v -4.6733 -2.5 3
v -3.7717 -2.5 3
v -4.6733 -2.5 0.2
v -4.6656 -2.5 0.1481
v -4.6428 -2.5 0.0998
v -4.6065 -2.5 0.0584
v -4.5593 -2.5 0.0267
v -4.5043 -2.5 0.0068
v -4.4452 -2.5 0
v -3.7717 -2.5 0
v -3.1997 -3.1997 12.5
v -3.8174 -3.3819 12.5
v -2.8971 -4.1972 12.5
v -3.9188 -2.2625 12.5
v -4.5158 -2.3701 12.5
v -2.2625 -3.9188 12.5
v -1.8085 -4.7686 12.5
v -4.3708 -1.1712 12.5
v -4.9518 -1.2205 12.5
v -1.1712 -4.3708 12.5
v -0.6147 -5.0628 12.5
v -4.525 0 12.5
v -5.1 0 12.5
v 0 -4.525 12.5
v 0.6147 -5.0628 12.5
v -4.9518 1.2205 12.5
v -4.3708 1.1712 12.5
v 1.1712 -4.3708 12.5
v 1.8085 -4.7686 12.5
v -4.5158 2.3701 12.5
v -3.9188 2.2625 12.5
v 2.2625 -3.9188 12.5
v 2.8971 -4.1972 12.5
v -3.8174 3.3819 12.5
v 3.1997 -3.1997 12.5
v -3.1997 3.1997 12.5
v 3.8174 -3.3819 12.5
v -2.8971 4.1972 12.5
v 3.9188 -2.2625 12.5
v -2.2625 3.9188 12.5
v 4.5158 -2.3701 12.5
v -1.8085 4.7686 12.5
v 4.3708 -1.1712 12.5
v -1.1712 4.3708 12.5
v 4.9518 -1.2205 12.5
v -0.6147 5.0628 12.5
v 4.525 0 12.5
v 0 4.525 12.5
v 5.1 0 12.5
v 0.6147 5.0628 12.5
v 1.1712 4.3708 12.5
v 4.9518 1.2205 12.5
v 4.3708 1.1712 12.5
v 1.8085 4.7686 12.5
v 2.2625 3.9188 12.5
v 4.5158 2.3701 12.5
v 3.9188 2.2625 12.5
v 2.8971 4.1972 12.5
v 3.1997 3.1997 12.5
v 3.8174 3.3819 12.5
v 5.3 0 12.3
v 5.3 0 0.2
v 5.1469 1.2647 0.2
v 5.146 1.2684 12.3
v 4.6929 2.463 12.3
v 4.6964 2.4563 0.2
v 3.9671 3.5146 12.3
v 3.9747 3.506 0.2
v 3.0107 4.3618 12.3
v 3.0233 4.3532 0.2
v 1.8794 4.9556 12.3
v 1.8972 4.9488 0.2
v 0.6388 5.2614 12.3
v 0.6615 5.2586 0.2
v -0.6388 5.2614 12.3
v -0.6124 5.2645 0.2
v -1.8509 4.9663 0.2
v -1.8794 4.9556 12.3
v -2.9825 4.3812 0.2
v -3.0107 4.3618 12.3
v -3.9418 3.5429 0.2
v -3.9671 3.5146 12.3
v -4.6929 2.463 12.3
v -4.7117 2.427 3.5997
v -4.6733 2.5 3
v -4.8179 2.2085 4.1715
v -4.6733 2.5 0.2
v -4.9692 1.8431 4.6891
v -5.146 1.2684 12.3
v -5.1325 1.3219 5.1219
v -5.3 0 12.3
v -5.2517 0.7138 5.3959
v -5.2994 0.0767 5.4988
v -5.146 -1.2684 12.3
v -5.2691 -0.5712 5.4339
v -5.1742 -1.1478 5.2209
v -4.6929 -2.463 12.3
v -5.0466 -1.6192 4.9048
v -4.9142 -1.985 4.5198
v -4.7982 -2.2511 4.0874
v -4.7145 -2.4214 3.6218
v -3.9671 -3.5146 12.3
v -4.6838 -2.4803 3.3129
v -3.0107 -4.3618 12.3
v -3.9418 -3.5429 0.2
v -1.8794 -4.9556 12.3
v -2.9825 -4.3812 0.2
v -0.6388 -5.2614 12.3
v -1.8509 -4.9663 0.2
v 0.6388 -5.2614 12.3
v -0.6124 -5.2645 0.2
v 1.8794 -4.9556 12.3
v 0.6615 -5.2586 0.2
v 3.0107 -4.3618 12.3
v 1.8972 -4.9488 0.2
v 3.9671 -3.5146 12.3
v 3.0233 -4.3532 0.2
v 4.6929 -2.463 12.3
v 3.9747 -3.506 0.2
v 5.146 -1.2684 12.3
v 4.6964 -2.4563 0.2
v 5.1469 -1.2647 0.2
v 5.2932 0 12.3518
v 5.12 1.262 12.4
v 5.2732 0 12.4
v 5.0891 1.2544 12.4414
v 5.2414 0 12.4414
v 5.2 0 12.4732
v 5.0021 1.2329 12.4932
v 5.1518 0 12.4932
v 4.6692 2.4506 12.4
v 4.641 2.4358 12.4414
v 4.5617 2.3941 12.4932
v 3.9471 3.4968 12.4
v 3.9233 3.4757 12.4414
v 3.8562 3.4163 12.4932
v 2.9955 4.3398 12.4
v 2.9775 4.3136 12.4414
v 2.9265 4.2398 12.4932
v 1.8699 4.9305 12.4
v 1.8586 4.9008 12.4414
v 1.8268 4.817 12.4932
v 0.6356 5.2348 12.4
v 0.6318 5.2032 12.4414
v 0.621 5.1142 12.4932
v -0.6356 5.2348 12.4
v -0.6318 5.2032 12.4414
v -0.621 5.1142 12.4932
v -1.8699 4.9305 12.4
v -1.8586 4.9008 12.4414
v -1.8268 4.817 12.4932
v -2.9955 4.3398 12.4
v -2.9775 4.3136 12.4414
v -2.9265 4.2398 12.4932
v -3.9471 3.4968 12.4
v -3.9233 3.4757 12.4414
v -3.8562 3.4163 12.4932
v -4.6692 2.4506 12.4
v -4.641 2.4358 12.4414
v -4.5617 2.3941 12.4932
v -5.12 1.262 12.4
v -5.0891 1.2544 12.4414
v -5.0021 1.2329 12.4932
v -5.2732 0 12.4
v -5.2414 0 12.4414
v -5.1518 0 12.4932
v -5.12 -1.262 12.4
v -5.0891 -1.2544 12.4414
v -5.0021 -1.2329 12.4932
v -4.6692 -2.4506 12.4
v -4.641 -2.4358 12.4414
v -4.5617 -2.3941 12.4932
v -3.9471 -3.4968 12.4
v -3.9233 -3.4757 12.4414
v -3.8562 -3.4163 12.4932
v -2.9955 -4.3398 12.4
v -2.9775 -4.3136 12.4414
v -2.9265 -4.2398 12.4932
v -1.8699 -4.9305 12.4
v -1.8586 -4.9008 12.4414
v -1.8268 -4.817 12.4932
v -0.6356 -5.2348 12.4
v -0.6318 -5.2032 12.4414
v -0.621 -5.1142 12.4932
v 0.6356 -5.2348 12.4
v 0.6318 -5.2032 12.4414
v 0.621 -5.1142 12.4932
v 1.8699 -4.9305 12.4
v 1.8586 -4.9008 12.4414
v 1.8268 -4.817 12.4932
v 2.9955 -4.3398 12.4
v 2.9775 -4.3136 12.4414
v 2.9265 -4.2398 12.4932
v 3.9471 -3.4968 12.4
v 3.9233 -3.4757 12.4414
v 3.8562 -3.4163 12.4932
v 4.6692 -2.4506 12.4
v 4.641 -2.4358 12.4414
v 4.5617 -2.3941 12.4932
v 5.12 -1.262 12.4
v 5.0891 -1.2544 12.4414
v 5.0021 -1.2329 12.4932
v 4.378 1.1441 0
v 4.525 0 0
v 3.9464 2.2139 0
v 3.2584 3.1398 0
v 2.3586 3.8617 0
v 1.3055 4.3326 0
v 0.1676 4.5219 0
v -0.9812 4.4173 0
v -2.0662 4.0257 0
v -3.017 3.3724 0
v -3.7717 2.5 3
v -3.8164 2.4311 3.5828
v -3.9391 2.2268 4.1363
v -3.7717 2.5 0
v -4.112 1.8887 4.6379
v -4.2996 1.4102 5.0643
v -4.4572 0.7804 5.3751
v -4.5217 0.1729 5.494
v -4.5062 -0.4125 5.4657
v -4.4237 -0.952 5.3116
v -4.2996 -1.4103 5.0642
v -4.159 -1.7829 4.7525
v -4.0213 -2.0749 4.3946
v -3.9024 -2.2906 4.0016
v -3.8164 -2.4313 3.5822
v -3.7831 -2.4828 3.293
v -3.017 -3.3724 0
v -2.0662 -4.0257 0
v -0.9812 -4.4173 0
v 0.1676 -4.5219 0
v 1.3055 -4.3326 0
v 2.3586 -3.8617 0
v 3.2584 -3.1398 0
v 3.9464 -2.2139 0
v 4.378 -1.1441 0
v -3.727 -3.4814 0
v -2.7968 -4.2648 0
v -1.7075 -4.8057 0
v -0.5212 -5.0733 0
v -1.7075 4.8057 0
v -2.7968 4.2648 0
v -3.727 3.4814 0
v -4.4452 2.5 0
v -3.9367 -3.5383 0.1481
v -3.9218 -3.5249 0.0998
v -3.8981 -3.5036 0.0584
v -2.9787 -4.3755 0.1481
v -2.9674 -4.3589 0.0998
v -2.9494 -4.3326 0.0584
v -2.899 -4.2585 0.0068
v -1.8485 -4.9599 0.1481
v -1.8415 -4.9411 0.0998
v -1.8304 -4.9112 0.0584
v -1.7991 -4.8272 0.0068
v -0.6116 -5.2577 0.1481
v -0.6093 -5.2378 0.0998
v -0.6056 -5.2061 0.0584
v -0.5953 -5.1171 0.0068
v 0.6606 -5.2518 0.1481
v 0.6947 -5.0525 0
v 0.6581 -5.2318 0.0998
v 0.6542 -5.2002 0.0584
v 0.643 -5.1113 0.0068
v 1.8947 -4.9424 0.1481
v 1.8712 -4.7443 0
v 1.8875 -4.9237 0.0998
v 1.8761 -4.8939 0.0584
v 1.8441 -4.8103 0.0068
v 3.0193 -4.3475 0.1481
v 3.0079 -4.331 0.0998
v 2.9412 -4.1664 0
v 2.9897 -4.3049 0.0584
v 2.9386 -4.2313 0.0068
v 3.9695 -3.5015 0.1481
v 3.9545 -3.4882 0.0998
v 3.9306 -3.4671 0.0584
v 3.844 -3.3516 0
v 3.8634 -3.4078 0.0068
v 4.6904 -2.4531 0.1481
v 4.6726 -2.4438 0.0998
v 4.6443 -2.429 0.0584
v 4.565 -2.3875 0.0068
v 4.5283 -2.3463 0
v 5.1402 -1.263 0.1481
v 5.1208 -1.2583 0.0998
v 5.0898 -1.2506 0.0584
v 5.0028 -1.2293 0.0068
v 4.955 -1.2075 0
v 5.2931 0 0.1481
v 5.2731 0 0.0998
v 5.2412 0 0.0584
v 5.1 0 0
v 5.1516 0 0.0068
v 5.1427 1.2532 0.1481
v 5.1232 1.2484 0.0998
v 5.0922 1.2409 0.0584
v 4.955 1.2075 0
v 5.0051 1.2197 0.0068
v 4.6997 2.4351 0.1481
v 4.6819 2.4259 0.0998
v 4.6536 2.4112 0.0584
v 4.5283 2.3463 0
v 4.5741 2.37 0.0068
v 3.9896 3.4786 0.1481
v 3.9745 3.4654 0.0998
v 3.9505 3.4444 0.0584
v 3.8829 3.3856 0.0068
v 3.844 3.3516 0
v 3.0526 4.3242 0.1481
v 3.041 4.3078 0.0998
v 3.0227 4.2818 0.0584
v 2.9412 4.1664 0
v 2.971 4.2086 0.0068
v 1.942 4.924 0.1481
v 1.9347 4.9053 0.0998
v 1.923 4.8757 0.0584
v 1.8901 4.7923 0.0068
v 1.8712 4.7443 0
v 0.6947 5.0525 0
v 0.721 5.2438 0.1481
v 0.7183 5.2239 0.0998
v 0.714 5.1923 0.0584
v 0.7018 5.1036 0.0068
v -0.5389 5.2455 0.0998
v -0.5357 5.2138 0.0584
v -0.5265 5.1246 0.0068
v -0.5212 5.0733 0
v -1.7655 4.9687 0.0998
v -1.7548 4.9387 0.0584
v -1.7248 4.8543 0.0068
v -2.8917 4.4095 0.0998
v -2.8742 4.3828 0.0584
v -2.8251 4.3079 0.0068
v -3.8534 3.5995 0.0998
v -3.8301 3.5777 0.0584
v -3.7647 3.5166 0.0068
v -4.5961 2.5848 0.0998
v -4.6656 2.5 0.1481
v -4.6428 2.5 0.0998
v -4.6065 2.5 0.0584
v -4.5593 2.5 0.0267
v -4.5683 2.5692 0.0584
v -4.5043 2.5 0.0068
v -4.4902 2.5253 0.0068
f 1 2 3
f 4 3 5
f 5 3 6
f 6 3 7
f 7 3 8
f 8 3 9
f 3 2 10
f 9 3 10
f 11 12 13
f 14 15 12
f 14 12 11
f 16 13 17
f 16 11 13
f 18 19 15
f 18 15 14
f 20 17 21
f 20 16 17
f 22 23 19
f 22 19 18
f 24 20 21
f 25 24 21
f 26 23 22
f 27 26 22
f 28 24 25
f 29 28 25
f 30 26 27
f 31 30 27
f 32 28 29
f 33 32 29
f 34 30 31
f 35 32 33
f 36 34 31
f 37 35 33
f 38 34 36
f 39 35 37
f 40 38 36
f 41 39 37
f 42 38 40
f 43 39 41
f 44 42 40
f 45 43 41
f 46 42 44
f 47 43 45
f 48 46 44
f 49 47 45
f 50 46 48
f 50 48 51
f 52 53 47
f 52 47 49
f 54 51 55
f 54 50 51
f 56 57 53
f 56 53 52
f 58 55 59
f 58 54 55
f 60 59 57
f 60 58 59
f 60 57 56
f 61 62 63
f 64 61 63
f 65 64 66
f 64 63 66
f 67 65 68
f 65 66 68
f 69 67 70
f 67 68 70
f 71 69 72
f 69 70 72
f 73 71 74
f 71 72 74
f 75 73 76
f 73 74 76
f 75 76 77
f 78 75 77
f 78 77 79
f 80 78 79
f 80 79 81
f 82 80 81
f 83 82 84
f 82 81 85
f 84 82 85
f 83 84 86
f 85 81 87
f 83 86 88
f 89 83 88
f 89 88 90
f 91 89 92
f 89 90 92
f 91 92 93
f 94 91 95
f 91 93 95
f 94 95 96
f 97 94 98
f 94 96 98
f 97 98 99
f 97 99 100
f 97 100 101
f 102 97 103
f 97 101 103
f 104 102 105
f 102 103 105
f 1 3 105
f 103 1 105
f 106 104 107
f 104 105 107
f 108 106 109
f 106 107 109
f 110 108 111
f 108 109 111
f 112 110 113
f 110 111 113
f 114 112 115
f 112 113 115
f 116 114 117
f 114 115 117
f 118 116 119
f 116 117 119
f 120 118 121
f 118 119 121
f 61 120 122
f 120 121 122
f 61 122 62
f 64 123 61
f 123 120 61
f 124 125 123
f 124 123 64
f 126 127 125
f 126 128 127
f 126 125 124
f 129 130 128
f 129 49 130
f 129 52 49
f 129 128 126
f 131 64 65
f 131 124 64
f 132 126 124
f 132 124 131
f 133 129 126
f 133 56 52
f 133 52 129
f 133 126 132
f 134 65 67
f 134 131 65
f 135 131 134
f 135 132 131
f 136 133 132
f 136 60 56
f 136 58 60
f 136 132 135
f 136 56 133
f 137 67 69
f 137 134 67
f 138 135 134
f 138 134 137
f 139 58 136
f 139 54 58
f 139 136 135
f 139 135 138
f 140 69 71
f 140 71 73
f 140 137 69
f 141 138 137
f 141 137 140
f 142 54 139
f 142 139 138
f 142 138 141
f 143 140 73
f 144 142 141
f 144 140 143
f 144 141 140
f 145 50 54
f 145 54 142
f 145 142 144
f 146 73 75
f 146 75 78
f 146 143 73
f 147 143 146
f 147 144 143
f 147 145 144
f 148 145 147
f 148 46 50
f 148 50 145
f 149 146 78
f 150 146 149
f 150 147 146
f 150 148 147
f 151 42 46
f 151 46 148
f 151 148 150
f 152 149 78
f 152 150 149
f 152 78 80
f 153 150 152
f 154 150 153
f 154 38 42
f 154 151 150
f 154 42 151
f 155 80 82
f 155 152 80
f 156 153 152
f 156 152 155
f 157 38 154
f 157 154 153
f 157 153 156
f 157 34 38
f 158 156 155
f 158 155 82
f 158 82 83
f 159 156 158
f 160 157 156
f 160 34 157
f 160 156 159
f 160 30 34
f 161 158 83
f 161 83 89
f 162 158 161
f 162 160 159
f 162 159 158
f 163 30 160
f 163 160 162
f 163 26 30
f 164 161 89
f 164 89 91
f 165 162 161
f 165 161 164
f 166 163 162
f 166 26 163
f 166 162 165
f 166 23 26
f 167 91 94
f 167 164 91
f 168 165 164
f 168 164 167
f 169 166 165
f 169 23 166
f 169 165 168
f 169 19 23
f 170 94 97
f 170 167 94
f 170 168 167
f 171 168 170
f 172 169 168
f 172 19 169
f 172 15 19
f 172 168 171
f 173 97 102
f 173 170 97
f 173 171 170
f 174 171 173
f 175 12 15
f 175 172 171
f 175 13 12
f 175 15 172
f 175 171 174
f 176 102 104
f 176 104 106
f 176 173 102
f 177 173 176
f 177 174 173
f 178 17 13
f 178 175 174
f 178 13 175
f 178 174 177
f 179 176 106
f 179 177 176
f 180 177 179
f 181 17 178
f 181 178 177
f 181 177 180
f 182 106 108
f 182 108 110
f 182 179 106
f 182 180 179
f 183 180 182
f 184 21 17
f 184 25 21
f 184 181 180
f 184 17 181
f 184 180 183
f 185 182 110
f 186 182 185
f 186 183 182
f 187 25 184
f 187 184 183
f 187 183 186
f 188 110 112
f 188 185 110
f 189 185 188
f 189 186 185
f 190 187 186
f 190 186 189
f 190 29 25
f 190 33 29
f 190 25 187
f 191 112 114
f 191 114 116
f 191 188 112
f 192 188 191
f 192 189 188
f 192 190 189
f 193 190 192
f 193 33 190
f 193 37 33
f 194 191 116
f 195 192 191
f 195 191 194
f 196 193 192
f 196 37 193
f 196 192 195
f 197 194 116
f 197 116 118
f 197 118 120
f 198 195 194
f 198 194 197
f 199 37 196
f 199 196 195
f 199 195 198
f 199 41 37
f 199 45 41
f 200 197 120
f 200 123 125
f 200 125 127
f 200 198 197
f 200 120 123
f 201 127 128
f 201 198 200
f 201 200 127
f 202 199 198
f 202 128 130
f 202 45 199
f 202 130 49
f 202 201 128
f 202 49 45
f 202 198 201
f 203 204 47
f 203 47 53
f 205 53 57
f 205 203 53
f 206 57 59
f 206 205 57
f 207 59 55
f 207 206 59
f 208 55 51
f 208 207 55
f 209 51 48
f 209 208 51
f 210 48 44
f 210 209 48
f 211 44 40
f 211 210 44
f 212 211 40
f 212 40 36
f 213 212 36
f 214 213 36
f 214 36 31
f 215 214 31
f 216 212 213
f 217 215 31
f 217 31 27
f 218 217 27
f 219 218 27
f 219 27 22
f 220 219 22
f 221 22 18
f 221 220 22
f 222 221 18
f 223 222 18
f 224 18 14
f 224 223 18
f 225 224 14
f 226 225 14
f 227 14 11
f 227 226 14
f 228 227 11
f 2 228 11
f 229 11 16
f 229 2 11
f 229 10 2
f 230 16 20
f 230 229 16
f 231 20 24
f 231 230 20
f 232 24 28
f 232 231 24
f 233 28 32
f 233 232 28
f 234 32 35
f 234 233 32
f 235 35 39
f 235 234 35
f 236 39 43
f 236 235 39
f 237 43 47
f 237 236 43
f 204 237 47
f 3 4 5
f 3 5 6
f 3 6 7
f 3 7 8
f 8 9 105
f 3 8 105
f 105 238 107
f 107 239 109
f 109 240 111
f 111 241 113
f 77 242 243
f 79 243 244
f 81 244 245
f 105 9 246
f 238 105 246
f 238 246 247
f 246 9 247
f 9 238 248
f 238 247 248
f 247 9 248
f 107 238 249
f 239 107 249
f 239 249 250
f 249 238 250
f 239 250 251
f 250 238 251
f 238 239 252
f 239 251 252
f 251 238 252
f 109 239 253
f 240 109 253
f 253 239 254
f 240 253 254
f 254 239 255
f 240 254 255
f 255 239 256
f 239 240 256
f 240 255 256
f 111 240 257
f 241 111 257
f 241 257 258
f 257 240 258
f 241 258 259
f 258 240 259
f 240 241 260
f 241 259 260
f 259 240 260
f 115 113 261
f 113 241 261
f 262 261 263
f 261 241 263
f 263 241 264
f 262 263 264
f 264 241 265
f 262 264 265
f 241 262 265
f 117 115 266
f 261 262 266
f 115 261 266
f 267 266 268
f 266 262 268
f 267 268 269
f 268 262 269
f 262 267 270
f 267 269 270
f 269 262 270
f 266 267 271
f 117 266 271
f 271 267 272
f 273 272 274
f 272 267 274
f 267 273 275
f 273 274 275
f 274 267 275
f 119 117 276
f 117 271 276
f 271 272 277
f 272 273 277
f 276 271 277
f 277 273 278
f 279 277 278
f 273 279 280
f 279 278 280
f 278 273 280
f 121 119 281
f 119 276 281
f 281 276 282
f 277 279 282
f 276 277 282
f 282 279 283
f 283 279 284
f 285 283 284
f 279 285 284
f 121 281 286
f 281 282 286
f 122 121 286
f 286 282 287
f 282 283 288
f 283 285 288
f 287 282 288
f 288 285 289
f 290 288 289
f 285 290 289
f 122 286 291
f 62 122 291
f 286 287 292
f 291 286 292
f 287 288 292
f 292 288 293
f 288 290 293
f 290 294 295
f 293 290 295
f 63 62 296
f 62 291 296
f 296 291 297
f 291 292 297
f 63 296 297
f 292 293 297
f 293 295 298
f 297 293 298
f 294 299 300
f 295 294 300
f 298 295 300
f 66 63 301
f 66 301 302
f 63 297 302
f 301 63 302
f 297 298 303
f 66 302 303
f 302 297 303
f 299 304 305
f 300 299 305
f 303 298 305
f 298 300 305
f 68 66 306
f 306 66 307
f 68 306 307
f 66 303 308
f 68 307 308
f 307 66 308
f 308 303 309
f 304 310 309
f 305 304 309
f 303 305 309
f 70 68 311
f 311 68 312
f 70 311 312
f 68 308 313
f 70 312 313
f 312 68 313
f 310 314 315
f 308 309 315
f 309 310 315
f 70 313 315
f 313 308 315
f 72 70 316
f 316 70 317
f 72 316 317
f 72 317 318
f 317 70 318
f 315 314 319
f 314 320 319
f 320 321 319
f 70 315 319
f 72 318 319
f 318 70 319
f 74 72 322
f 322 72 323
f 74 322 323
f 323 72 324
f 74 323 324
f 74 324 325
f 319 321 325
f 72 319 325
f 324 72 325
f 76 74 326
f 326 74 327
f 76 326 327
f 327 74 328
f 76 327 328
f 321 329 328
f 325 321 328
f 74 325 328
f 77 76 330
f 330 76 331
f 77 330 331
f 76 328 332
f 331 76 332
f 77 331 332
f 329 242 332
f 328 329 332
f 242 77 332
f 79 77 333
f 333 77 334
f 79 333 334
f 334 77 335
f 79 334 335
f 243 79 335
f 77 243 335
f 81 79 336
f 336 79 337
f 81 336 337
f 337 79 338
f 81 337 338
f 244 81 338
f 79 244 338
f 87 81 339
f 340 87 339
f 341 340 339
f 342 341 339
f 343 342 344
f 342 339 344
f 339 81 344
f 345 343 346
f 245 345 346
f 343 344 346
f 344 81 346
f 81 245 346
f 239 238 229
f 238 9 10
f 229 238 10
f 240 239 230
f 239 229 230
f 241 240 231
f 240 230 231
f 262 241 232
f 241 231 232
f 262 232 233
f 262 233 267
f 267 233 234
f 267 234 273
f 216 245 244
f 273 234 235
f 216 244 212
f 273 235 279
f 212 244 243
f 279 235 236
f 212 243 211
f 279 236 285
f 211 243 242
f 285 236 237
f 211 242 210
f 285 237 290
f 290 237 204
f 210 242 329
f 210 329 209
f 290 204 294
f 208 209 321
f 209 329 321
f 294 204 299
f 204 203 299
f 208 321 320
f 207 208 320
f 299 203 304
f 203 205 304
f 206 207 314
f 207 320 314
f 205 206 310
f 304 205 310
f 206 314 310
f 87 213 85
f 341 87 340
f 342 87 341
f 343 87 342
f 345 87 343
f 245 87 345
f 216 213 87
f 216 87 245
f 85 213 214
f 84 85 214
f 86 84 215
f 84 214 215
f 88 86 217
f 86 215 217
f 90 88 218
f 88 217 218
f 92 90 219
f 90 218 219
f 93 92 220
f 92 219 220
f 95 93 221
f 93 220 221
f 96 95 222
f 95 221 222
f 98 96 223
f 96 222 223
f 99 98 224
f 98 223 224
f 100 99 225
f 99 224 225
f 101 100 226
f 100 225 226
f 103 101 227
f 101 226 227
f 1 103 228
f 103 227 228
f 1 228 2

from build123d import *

# Parameters (mm, degrees)
SKETCH_1_R          = 5.3
SKETCH_1_R_2        = 4.525
EXTRUDE_1_DEPTH     = 12.5
SKETCH_2_R          = 2.5
SKETCH_2_W          = 3.970430226
SKETCH_2_H          = 5
CUT_EXTRUDE_1_DEPTH = 12.5
FILLET_1_R          = 0.2


with BuildPart() as part:
    # 草图1 → 凸台-拉伸1 (new body)
    with BuildSketch(Plane.XY):
        Circle(SKETCH_1_R)
        Circle(SKETCH_1_R_2, mode=Mode.SUBTRACT)
    extrude(amount=EXTRUDE_1_DEPTH)

    # 草图2 → 切除-拉伸1 (cut)
    with BuildSketch(Plane(origin=(0, 0, 0), x_dir=(0, 0, -1), z_dir=(1, 0, 0))):
        with Locations((-3, 0)):
            Circle(SKETCH_2_R)
        with Locations((-1.014784887, 0)):
            Rectangle(SKETCH_2_W, SKETCH_2_H)
    extrude(amount=-CUT_EXTRUDE_1_DEPTH, mode=Mode.SUBTRACT)

    # 圆角1
    fillet_1_edges = [part.edges().sort_by_distance(p)[0] for p in [
        (1.288673453, 5.14094551, 0),
        (-5.3, 0, 12.5),
    ]]
    fillet(fillet_1_edges, radius=FILLET_1_R)


solid = part.part
